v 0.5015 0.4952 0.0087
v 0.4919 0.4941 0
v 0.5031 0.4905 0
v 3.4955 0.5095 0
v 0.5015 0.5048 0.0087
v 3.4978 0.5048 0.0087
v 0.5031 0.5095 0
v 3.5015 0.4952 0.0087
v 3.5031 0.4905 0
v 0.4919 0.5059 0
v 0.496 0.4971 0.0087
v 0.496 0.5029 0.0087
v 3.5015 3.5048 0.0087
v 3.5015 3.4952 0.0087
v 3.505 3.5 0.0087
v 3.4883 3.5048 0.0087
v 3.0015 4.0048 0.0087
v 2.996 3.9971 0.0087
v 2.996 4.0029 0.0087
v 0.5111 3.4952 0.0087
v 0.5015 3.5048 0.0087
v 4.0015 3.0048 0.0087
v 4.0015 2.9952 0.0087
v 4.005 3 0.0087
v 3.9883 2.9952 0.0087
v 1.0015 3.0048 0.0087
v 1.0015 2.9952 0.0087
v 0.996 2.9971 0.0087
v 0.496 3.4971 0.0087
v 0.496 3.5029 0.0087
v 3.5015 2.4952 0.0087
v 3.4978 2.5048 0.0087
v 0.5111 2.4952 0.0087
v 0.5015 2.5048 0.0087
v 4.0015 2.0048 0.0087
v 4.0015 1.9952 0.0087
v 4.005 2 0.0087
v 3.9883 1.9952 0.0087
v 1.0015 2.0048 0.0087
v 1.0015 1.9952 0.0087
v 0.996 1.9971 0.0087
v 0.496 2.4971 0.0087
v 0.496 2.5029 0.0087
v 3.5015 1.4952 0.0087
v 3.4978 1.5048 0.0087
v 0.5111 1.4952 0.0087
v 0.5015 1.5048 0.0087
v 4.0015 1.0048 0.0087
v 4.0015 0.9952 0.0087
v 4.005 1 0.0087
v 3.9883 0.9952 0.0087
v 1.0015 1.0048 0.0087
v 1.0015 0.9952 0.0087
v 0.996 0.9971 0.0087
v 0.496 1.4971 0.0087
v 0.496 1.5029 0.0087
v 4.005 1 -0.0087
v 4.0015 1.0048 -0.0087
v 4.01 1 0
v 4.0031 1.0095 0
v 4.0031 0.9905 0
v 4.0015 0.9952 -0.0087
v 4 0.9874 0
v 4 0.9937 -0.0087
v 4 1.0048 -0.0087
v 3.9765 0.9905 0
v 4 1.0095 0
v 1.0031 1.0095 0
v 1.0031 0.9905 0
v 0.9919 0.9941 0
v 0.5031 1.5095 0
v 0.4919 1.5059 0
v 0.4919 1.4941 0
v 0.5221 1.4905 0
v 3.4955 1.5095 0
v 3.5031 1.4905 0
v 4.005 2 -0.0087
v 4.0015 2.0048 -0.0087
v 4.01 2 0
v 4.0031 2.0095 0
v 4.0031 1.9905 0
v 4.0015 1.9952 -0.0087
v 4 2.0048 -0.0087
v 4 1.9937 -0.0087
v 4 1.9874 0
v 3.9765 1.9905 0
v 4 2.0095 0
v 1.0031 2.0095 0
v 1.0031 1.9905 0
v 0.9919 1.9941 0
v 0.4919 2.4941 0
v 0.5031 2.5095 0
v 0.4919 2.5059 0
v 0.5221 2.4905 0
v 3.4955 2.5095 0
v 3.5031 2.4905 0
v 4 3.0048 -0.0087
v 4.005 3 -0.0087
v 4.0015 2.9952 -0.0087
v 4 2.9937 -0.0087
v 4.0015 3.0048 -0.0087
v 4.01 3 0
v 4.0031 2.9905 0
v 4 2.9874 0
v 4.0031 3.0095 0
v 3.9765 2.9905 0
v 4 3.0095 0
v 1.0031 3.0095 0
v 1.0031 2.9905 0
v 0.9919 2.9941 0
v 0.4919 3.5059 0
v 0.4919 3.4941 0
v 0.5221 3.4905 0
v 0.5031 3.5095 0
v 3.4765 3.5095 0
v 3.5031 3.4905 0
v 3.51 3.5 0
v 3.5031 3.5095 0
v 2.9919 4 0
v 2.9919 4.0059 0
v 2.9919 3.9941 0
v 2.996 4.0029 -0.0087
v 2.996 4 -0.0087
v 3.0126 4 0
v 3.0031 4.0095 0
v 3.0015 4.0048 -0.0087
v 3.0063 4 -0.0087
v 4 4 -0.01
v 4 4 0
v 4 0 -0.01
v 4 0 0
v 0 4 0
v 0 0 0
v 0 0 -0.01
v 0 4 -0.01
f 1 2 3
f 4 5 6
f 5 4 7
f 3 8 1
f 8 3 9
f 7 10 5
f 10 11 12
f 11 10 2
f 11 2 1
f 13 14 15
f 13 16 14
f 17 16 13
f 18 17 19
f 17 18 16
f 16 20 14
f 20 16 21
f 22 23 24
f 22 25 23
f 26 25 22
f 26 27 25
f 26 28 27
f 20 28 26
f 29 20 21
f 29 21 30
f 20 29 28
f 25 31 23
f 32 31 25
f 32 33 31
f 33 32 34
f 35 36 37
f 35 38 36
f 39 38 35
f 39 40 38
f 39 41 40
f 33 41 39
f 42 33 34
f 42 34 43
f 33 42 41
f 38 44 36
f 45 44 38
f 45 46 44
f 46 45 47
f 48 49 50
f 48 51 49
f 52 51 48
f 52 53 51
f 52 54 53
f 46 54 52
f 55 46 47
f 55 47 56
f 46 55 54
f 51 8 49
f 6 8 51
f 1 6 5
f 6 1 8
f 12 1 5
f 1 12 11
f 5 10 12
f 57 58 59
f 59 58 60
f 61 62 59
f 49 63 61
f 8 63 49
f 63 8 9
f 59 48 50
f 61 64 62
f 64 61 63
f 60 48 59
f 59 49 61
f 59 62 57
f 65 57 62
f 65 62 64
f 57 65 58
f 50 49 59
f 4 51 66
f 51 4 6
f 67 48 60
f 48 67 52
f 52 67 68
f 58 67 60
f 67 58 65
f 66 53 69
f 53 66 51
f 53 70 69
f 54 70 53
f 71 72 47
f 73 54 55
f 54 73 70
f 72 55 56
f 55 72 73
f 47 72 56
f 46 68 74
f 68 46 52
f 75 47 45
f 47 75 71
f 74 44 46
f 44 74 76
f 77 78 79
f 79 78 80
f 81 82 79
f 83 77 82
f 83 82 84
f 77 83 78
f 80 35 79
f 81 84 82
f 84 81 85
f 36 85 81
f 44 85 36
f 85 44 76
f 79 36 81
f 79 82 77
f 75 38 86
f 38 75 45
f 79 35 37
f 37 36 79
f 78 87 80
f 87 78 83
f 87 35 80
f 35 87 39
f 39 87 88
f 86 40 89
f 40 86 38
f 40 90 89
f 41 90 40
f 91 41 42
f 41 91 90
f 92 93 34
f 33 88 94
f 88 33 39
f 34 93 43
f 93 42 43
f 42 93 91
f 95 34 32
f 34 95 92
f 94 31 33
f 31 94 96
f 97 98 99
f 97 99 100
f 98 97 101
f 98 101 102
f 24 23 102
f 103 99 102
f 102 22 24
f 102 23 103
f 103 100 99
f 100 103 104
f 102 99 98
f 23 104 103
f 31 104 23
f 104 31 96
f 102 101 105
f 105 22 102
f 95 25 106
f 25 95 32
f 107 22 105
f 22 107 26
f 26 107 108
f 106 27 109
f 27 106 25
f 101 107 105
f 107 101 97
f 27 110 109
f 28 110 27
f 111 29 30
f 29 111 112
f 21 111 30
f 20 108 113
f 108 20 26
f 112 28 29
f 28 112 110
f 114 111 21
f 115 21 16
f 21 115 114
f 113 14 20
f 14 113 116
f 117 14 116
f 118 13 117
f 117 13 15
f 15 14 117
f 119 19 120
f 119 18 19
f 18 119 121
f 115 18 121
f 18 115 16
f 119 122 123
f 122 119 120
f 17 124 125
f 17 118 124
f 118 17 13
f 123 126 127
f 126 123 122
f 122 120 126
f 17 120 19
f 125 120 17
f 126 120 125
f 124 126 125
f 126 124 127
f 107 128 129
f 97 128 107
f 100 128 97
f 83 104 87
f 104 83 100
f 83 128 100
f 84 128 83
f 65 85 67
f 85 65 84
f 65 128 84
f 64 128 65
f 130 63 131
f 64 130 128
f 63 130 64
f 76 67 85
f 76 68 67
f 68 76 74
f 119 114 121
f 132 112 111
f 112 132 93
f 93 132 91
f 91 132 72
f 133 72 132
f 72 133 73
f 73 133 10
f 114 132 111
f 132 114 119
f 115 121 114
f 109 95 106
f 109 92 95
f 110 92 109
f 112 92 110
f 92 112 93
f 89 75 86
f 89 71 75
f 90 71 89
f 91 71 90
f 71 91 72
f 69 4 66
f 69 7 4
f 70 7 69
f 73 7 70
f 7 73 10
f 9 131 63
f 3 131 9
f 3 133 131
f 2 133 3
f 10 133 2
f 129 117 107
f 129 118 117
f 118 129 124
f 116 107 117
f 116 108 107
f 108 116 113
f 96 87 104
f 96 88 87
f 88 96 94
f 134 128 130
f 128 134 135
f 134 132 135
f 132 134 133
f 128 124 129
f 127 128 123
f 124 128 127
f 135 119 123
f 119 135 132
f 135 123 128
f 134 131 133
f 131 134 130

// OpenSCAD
hull(){
    translate([0.5, 0.5]) sphere(0.01);
    translate([1.5, 0.5]) sphere(0.01);
}
hull(){
    translate([1.5, 0.5]) sphere(0.01);
    translate([2.5, 0.5]) sphere(0.01);
}
hull(){
    translate([2.5, 0.5]) sphere(0.01);
    translate([3.5, 0.5]) sphere(0.01);
}
hull(){
    translate([3.5, 0.5]) sphere(0.01);
    translate([4.0, 1.0]) sphere(0.01);
}
hull(){
    translate([4.0, 1.0]) sphere(0.01);
    translate([3.0, 1.0]) sphere(0.01);
}
hull(){
    translate([3.0, 1.0]) sphere(0.01);
    translate([2.0, 1.0]) sphere(0.01);
}
hull(){
    translate([2.0, 1.0]) sphere(0.01);
    translate([1.0, 1.0]) sphere(0.01);
}
hull(){
    translate([1.0, 1.0]) sphere(0.01);
    translate([0.5, 1.5]) sphere(0.01);
}
hull(){
    translate([0.5, 1.5]) sphere(0.01);
    translate([1.5, 1.5]) sphere(0.01);
}
hull(){
    translate([1.5, 1.5]) sphere(0.01);
    translate([2.5, 1.5]) sphere(0.01);
}
hull(){
    translate([2.5, 1.5]) sphere(0.01);
    translate([3.5, 1.5]) sphere(0.01);
}
hull(){
    translate([3.5, 1.5]) sphere(0.01);
    translate([4.0, 2.0]) sphere(0.01);
}
hull(){
    translate([4.0, 2.0]) sphere(0.01);
    translate([3.0, 2.0]) sphere(0.01);
}
hull(){
    translate([3.0, 2.0]) sphere(0.01);
    translate([2.0, 2.0]) sphere(0.01);
}
hull(){
    translate([2.0, 2.0]) sphere(0.01);
    translate([1.0, 2.0]) sphere(0.01);
}
hull(){
    translate([1.0, 2.0]) sphere(0.01);
    translate([0.5, 2.5]) sphere(0.01);
}
hull(){
    translate([0.5, 2.5]) sphere(0.01);
    translate([1.5, 2.5]) sphere(0.01);
}
hull(){
    translate([1.5, 2.5]) sphere(0.01);
    translate([2.5, 2.5]) sphere(0.01);
}
hull(){
    translate([2.5, 2.5]) sphere(0.01);
    translate([3.5, 2.5]) sphere(0.01);
}
hull(){
    translate([3.5, 2.5]) sphere(0.01);
    translate([4.0, 3.0]) sphere(0.01);
}
hull(){
    translate([4.0, 3.0]) sphere(0.01);
    translate([3.0, 3.0]) sphere(0.01);
}
hull(){
    translate([3.0, 3.0]) sphere(0.01);
    translate([2.0, 3.0]) sphere(0.01);
}
hull(){
    translate([2.0, 3.0]) sphere(0.01);
    translate([1.0, 3.0]) sphere(0.01);
}
hull(){
    translate([1.0, 3.0]) sphere(0.01);
    translate([0.5, 3.5]) sphere(0.01);
}
hull(){
    translate([0.5, 3.5]) sphere(0.01);
    translate([1.5, 3.5]) sphere(0.01);
}
hull(){
    translate([1.5, 3.5]) sphere(0.01);
    translate([2.5, 3.5]) sphere(0.01);
}
hull(){
    translate([2.5, 3.5]) sphere(0.01);
    translate([3.5, 3.5]) sphere(0.01);
}
hull(){
    translate([3.5, 3.5]) sphere(0.01);
    translate([3.0, 4.0]) sphere(0.01);
}
translate([0,0,-0.01]) color([0.1,0.1,0.1]) cube([4,4,0.01]);
